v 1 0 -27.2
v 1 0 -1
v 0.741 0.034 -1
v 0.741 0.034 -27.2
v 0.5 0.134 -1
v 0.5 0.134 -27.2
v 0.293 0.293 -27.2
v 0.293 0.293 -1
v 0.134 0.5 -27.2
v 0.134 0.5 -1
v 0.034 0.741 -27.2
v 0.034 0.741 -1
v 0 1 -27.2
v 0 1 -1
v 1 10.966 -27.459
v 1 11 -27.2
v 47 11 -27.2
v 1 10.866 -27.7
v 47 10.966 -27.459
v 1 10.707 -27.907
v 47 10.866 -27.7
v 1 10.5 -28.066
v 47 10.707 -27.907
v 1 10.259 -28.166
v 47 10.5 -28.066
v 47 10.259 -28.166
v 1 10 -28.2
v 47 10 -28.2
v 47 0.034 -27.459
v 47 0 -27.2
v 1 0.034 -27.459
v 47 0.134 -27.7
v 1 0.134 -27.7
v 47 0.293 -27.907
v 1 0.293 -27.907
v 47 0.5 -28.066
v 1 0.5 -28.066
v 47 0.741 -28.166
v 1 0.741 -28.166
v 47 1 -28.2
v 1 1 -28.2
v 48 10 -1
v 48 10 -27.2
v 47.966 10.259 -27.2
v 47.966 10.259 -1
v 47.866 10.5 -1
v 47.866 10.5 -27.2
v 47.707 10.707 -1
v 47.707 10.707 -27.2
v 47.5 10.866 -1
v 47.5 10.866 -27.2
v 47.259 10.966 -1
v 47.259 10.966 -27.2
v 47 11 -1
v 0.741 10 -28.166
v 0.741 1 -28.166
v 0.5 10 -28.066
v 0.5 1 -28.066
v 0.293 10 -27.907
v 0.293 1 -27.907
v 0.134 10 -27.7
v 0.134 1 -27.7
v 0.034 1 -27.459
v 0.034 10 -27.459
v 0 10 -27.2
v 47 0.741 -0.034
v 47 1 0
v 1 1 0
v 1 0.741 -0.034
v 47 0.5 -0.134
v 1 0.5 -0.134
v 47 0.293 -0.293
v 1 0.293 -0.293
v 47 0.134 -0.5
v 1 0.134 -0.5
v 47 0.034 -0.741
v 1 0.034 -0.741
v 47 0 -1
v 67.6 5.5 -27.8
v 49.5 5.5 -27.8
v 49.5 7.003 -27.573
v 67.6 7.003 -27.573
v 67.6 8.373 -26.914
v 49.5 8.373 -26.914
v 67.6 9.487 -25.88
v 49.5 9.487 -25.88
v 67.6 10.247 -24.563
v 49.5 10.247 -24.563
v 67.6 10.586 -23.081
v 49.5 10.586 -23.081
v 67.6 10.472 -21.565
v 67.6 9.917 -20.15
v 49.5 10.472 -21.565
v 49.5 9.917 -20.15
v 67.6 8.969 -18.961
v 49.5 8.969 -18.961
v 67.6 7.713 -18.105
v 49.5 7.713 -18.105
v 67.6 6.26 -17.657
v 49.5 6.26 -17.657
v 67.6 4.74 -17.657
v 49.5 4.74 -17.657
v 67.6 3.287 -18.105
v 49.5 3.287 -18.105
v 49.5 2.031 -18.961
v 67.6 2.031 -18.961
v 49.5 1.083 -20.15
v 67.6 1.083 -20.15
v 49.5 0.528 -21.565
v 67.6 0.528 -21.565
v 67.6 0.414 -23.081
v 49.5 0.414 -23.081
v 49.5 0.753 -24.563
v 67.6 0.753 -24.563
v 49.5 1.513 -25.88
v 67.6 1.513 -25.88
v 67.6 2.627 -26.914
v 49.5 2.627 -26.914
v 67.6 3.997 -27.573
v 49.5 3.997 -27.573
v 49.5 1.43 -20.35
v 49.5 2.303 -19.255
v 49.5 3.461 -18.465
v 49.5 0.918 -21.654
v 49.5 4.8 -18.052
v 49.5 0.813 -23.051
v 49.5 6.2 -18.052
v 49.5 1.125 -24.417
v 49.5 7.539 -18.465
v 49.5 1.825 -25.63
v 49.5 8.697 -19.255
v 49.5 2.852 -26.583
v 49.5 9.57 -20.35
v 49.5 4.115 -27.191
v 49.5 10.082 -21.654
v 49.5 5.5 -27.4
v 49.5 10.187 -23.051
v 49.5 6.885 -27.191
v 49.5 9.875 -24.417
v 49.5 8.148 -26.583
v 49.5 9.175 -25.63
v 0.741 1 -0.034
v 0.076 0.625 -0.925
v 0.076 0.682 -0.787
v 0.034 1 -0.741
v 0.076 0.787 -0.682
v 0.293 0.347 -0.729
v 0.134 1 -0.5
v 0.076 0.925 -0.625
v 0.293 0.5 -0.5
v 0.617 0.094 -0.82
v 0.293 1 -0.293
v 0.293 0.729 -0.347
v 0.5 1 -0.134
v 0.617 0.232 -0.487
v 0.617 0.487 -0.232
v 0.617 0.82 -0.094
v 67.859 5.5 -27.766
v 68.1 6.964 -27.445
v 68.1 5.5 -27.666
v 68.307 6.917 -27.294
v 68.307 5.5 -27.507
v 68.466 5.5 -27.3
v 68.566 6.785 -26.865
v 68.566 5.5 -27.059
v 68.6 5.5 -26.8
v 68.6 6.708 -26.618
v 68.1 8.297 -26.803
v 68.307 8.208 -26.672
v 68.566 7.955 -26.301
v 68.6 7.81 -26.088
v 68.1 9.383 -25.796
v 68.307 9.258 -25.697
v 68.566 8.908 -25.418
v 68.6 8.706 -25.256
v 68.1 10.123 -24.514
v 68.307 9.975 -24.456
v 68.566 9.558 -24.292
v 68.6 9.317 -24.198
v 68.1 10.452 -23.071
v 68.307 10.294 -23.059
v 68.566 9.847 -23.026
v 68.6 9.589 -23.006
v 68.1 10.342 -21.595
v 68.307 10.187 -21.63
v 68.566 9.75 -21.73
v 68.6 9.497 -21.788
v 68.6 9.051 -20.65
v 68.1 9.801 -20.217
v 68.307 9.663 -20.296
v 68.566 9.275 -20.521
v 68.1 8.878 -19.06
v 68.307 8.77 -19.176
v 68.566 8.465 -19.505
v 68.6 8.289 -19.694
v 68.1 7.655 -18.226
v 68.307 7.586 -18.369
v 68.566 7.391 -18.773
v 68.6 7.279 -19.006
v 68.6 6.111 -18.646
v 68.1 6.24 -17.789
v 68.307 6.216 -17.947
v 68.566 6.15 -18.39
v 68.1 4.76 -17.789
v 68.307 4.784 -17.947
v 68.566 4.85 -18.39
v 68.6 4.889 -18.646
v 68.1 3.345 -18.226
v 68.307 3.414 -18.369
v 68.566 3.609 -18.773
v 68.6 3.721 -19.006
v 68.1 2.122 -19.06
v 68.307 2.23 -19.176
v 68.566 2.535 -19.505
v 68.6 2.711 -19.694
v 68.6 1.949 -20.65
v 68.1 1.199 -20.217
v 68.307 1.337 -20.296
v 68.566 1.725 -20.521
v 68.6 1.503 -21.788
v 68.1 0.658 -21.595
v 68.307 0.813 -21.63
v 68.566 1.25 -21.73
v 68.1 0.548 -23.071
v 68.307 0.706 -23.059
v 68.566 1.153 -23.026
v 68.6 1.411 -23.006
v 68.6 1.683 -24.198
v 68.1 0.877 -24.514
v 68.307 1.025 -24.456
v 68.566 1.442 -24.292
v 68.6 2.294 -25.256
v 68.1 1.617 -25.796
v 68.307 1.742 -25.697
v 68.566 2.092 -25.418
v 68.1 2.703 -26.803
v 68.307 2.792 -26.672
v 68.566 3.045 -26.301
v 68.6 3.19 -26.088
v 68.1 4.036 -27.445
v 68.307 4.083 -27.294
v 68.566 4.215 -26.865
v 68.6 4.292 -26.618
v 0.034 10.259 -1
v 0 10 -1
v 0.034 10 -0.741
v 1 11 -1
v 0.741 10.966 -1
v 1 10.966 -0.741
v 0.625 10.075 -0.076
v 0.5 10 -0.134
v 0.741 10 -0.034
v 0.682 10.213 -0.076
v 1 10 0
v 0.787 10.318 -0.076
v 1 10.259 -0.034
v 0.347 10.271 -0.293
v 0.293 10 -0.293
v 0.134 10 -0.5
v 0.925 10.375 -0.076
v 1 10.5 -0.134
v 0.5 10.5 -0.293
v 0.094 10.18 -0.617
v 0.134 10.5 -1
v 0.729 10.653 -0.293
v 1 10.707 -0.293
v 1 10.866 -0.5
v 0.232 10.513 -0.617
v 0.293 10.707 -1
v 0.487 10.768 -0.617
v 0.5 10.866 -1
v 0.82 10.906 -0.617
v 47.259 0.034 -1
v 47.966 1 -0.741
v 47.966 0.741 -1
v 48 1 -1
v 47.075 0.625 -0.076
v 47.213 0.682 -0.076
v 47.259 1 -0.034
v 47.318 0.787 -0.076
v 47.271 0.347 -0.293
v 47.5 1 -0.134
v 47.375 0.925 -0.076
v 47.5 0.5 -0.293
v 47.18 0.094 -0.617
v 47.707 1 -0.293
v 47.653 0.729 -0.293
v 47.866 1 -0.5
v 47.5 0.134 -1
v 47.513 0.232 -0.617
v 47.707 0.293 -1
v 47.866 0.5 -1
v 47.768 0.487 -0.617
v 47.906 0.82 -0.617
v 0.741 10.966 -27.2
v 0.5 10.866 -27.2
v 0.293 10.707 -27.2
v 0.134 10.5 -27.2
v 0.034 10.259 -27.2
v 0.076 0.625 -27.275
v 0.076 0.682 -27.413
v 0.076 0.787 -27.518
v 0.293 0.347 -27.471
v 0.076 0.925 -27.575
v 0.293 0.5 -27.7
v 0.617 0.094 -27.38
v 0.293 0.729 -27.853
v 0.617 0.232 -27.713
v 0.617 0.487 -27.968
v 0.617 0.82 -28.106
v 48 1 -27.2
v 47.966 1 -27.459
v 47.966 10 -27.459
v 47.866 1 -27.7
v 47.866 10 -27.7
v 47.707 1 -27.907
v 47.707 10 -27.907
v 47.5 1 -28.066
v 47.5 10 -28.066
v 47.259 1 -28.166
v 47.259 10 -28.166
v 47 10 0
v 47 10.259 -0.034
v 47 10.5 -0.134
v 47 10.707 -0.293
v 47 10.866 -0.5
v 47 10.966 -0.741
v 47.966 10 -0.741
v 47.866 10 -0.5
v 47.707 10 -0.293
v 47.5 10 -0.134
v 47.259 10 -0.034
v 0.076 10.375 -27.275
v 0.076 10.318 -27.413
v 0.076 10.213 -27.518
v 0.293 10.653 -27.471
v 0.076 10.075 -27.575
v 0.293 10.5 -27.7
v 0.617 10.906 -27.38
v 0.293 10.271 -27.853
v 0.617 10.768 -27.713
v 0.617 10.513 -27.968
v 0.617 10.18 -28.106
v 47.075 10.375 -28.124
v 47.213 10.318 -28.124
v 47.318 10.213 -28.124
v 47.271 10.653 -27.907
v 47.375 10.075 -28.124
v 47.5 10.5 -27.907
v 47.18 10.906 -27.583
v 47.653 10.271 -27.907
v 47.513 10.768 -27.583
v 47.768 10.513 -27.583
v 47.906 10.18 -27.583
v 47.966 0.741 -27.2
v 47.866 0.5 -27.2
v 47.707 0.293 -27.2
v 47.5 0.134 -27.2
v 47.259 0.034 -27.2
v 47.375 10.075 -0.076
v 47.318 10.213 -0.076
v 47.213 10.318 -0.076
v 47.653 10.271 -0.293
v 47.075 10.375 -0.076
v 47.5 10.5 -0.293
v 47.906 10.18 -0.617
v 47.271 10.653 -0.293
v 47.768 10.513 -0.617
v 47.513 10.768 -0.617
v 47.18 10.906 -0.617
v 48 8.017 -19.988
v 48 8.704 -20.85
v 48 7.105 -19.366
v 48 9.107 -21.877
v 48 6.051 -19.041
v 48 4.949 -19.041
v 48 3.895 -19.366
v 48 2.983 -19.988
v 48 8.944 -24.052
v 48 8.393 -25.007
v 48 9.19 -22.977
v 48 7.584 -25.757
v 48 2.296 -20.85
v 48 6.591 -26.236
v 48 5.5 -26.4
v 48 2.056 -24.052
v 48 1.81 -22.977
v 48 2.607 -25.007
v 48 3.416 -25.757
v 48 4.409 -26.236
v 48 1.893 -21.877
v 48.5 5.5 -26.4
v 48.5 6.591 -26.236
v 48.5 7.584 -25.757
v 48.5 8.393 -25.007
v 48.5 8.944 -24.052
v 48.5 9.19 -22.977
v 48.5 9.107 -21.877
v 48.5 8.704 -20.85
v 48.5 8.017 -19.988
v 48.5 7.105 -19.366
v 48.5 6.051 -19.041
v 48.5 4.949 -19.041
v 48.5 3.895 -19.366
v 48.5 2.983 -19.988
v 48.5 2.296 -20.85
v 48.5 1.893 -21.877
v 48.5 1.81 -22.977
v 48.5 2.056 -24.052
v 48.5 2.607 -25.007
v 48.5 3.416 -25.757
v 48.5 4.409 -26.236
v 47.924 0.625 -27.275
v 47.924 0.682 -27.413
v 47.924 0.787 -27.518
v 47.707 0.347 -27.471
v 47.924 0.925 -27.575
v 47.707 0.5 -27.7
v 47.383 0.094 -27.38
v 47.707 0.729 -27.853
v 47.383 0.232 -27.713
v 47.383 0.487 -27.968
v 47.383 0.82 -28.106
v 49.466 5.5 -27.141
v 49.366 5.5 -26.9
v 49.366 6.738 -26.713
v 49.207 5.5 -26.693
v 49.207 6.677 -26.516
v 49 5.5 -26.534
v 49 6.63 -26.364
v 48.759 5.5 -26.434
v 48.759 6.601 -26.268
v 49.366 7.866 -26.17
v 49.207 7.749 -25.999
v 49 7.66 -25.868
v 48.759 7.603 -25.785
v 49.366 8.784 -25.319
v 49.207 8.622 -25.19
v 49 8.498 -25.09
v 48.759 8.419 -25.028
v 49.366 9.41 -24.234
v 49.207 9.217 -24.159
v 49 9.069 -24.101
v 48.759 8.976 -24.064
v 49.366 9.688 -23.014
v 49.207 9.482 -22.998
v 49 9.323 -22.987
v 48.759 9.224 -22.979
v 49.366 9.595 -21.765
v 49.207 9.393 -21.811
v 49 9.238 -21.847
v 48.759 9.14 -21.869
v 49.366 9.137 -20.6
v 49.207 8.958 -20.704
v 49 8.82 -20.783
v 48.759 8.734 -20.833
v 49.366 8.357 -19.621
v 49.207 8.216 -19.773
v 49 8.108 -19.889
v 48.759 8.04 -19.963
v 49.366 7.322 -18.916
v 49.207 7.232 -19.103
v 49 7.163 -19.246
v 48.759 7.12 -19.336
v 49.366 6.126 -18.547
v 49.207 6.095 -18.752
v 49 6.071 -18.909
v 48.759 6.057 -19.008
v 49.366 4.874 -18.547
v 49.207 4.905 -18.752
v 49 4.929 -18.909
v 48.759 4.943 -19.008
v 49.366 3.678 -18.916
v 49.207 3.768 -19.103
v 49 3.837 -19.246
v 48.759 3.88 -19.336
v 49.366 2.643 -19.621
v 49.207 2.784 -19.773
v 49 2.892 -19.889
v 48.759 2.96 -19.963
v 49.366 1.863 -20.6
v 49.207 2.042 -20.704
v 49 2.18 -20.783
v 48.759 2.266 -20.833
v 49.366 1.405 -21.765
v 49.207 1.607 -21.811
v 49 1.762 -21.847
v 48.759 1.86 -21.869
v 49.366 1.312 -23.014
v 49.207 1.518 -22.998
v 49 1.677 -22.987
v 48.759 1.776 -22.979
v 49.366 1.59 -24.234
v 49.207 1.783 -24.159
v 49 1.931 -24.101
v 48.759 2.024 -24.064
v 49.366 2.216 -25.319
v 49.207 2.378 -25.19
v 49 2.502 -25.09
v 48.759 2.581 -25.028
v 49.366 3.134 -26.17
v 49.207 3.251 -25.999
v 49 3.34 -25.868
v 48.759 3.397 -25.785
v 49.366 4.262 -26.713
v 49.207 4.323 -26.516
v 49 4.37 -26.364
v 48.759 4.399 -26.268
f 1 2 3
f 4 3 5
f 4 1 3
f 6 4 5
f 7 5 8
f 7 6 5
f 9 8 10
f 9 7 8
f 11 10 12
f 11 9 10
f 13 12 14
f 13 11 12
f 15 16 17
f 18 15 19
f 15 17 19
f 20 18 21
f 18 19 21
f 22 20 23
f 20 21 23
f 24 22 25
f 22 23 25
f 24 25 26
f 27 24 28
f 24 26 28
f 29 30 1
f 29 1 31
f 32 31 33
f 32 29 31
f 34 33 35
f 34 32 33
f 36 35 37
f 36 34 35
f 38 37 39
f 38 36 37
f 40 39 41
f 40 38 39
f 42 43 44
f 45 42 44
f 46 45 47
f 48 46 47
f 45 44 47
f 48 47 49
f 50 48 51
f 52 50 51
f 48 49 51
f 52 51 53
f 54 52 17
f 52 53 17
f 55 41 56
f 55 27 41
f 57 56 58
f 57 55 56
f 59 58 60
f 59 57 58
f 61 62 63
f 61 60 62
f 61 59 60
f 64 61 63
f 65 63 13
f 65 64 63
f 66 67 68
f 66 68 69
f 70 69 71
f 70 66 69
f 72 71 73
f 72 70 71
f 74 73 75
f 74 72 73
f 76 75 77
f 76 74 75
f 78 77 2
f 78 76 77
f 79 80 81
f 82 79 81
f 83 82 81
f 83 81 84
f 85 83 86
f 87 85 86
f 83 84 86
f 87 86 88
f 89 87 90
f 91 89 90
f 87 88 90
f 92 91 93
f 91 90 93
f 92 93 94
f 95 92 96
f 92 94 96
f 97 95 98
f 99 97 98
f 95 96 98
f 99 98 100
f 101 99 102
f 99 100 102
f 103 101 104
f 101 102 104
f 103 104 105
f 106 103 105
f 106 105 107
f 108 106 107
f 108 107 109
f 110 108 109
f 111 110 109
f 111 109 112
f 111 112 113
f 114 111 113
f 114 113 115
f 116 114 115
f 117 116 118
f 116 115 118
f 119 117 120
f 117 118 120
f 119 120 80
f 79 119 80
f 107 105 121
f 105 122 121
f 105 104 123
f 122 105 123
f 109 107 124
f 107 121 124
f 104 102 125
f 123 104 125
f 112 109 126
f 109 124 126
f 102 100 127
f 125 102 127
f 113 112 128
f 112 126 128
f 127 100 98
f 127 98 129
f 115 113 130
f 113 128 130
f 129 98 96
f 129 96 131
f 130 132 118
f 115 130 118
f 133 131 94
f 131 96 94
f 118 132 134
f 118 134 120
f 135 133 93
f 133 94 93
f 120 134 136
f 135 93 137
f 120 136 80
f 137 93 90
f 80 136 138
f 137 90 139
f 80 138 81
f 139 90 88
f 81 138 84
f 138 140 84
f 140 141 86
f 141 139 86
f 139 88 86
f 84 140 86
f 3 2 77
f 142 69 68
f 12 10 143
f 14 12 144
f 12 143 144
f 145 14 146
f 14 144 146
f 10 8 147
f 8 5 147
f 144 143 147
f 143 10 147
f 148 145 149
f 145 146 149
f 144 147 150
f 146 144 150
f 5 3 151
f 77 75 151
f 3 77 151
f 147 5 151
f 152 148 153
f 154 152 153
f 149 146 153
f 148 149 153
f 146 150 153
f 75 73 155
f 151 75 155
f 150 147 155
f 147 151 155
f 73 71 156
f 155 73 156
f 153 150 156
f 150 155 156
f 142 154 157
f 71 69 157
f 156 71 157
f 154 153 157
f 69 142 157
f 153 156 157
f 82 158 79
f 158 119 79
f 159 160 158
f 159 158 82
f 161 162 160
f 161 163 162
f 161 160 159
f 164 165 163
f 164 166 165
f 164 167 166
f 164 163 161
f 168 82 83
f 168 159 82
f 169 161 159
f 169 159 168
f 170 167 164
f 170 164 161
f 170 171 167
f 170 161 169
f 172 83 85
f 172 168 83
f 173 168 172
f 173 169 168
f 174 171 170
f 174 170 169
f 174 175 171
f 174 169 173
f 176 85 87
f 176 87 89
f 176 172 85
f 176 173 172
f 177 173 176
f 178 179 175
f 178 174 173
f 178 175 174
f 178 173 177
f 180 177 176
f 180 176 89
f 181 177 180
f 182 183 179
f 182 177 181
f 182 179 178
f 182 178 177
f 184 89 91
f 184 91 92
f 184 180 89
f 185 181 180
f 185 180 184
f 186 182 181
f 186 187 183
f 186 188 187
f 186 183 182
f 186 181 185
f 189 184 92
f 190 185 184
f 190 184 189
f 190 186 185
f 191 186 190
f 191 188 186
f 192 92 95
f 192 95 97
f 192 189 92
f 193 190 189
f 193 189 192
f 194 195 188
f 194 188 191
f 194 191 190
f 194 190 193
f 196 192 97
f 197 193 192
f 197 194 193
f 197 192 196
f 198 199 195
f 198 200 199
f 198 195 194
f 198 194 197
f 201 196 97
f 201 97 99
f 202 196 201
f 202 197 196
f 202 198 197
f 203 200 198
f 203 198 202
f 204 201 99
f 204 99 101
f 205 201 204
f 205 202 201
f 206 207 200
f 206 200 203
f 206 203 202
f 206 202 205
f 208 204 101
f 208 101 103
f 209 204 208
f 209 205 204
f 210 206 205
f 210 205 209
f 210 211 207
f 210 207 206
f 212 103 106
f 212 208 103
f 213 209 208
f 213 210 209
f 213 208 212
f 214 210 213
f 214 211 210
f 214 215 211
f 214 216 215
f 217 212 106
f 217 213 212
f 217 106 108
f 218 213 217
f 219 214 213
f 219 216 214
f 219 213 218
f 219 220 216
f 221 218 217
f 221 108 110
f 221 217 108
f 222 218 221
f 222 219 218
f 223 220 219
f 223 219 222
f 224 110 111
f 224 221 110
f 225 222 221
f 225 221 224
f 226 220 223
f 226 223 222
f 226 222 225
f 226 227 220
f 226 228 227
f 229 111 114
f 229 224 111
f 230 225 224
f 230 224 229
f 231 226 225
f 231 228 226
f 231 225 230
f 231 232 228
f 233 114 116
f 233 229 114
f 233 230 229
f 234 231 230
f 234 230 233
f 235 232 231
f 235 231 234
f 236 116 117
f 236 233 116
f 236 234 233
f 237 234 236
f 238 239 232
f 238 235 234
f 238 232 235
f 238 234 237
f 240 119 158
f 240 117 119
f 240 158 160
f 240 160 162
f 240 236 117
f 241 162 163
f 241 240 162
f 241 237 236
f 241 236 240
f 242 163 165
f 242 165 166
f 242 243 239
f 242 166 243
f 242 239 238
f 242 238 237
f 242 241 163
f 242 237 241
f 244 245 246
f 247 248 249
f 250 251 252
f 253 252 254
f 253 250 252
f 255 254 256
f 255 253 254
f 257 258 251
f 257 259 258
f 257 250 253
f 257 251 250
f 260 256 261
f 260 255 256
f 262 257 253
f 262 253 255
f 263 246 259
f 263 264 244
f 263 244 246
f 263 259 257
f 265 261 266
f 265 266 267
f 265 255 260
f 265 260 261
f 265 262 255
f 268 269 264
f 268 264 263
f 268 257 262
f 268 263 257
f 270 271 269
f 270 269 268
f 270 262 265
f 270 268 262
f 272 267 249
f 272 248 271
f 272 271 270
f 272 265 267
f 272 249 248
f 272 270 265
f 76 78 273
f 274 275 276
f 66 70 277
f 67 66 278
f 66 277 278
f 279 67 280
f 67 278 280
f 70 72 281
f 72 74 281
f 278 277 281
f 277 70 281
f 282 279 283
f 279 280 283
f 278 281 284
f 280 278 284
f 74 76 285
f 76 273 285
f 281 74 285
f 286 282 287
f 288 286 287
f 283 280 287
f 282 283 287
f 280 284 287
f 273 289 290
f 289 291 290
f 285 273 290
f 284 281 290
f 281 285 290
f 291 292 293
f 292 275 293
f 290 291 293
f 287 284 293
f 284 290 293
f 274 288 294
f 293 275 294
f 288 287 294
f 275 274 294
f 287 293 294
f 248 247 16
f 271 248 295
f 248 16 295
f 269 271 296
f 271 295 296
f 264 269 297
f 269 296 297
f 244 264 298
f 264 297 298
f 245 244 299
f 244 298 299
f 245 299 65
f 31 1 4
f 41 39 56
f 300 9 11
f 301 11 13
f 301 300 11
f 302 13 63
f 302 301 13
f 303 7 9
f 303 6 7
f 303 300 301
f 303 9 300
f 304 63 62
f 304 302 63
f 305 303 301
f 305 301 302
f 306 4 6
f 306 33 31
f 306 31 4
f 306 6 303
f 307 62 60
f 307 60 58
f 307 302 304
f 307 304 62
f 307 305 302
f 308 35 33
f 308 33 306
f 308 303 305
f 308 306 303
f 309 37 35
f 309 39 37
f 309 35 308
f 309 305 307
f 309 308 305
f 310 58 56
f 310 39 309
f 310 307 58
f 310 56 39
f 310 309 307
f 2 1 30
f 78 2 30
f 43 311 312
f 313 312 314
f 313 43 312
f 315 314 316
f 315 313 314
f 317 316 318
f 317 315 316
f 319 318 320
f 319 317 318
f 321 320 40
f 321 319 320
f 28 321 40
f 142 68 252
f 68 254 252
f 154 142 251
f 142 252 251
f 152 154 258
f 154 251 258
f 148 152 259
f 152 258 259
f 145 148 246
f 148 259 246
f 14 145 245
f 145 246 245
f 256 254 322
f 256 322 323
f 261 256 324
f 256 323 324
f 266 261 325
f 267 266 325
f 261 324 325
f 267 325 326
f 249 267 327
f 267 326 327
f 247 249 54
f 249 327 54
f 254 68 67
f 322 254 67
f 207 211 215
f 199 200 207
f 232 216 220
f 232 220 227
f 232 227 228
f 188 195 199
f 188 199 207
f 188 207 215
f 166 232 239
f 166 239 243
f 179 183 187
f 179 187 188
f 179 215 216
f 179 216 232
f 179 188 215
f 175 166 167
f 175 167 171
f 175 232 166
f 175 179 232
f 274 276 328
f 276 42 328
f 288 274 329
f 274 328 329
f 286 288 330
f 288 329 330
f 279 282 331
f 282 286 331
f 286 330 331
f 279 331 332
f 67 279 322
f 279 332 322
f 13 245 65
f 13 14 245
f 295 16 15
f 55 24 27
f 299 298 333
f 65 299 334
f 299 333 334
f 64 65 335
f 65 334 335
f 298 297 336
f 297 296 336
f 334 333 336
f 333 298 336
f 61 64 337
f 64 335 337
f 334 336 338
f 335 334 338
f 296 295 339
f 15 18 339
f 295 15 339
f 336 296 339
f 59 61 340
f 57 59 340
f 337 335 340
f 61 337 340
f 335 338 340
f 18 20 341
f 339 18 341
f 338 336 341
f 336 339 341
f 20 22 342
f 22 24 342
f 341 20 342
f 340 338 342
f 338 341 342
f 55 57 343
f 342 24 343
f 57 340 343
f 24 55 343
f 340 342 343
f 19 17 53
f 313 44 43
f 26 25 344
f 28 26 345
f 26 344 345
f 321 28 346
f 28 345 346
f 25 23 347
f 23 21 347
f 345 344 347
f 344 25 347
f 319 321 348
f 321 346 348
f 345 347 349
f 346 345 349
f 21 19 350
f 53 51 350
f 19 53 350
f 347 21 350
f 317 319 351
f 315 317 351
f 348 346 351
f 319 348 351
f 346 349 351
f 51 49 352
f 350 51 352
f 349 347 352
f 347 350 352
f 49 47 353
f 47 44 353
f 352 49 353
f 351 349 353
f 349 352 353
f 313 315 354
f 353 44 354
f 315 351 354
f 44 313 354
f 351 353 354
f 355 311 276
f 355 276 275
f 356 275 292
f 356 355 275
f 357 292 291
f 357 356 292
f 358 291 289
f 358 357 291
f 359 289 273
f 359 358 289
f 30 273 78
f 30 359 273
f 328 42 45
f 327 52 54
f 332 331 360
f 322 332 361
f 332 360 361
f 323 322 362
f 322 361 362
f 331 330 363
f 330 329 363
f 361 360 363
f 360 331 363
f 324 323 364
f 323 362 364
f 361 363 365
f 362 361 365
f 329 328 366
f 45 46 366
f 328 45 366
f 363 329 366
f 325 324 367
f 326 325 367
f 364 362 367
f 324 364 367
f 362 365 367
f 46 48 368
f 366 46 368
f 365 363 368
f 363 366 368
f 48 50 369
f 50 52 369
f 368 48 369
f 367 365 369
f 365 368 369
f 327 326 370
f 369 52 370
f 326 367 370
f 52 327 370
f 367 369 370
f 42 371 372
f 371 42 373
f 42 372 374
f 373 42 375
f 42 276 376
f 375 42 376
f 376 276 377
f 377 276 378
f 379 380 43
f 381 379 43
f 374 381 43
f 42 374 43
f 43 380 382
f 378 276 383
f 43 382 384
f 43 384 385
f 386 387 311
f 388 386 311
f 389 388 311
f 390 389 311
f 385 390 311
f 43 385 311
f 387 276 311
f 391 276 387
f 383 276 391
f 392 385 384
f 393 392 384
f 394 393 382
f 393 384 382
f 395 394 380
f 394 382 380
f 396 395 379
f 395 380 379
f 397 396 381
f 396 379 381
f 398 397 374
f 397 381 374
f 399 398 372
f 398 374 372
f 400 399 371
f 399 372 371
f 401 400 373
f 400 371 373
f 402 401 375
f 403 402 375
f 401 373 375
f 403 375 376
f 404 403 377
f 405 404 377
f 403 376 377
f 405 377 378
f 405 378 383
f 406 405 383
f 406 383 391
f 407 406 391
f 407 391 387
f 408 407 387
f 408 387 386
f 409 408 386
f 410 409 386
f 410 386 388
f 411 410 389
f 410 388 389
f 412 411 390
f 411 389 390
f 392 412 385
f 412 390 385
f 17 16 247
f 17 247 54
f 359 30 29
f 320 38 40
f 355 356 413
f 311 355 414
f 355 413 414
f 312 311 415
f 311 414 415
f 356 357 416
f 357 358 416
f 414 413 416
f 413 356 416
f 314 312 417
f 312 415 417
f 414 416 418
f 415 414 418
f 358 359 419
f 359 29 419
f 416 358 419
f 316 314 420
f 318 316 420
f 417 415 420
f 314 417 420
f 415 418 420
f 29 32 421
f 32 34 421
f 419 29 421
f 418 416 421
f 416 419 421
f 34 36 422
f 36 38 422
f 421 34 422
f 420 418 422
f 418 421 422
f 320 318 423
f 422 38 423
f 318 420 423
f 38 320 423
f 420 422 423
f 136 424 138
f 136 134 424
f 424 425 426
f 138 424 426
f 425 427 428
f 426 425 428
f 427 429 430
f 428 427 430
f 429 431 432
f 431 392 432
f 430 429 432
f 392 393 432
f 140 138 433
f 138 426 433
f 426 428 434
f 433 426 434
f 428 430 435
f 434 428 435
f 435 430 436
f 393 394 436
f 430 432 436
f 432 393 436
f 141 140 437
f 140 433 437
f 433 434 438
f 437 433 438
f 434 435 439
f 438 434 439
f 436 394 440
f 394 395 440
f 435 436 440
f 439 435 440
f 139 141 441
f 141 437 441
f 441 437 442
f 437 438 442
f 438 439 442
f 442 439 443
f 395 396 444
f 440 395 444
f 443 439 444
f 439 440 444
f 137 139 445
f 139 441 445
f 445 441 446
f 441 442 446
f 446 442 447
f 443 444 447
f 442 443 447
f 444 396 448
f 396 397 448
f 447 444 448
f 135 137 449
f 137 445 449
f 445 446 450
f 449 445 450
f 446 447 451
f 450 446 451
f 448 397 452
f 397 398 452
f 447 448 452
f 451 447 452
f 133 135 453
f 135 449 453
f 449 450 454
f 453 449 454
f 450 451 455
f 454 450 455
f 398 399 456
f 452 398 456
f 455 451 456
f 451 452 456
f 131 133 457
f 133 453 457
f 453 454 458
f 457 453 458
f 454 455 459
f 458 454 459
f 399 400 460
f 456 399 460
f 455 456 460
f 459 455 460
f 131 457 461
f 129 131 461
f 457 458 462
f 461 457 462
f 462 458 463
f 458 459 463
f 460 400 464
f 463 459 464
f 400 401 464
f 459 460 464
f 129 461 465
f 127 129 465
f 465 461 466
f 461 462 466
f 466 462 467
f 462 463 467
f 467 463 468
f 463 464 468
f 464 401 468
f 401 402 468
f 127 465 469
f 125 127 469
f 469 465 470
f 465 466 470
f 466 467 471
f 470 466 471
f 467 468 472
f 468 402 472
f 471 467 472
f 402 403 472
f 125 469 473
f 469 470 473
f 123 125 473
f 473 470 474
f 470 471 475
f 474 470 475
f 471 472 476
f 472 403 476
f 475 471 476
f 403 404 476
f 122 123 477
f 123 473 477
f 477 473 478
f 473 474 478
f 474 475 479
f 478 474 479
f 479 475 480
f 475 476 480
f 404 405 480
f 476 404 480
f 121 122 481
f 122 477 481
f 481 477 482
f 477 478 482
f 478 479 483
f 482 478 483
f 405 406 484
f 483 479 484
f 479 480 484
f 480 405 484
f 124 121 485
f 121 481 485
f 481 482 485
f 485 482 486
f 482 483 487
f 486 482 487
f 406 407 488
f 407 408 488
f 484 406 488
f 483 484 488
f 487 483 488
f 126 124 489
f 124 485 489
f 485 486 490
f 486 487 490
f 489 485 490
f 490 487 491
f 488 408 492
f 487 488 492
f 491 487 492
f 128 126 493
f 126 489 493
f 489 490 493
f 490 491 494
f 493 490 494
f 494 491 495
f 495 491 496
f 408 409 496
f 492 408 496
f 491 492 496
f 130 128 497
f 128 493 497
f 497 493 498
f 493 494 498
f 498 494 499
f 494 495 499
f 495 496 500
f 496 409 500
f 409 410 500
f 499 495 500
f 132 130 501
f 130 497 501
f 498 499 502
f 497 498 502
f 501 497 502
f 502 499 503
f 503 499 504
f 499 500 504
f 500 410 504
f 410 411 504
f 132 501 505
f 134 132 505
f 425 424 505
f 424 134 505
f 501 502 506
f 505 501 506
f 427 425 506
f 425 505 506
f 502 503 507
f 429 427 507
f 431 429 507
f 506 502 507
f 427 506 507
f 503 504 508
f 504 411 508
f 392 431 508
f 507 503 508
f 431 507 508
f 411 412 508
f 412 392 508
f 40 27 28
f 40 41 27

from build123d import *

# Parameters (mm, degrees)
SKETCH1_W           = 48
SKETCH1_H           = 28.2
BOSS_EXTRUDE1_DEPTH = 11
SKETCH2_R           = 3.7
BOSS_EXTRUDE2_DEPTH = 1.5
SKETCH3_R           = 5.1
BOSS_EXTRUDE3_DEPTH = 19.1
FILLET1_R           = 1
FILLET2_R           = 1
FILLET3_R           = 1


with BuildPart() as part:
    # Sketch1 → Boss-Extrude1 (new body)
    with BuildSketch(Plane(origin=(0, 0, 0), x_dir=(1, 0, 0), z_dir=(0, 1, 0))):
        with Locations((24, 14.1)):
            Rectangle(SKETCH1_W, SKETCH1_H)
    extrude(amount=BOSS_EXTRUDE1_DEPTH)

    # Sketch2 → Boss-Extrude2 (add)
    with BuildSketch(Plane(origin=(48, 0, 0), x_dir=(0, 0, -1), z_dir=(1, 0, 0))):
        with Locations((22.7, 5.5)):
            Circle(SKETCH2_R)
    extrude(amount=BOSS_EXTRUDE2_DEPTH)

    # Sketch3 → Boss-Extrude3 (add)
    with BuildSketch(Plane(origin=(49.5, 0, 0), x_dir=(0, 0, -1), z_dir=(1, 0, 0))):
        with Locations((22.7, 5.5)):
            Circle(SKETCH3_R)
    extrude(amount=BOSS_EXTRUDE3_DEPTH)

    # Fillet1
    fillet1_edges = [part.edges().sort_by_distance(p)[0] for p in [
        (48, 11, -14.1),
        (24, 11, -28.2),
        (0, 11, -14.1),
        (24, 0, -28.2),
        (48, 0, -14.1),
        (24, 0, 0),
        (0, 0, -14.1),
        (0, 5.5, -28.2),
        (48, 5.5, -28.2),
        (48, 5.5, 0),
        (0, 5.5, 0),
        (24, 11, 0),
    ]]
    fillet(fillet1_edges, radius=FILLET1_R)

    # Fillet2
    fillet2_edges = [part.edges().sort_by_distance(p)[0] for p in [
        (68.6, 5.5, -17.6),
    ]]
    fillet(fillet2_edges, radius=FILLET2_R)

    # Fillet3
    fillet3_edges = [part.edges().sort_by_distance(p)[0] for p in [
        (49.5, 5.5, -19),
    ]]
    fillet(fillet3_edges, radius=FILLET3_R)


solid = part.part
